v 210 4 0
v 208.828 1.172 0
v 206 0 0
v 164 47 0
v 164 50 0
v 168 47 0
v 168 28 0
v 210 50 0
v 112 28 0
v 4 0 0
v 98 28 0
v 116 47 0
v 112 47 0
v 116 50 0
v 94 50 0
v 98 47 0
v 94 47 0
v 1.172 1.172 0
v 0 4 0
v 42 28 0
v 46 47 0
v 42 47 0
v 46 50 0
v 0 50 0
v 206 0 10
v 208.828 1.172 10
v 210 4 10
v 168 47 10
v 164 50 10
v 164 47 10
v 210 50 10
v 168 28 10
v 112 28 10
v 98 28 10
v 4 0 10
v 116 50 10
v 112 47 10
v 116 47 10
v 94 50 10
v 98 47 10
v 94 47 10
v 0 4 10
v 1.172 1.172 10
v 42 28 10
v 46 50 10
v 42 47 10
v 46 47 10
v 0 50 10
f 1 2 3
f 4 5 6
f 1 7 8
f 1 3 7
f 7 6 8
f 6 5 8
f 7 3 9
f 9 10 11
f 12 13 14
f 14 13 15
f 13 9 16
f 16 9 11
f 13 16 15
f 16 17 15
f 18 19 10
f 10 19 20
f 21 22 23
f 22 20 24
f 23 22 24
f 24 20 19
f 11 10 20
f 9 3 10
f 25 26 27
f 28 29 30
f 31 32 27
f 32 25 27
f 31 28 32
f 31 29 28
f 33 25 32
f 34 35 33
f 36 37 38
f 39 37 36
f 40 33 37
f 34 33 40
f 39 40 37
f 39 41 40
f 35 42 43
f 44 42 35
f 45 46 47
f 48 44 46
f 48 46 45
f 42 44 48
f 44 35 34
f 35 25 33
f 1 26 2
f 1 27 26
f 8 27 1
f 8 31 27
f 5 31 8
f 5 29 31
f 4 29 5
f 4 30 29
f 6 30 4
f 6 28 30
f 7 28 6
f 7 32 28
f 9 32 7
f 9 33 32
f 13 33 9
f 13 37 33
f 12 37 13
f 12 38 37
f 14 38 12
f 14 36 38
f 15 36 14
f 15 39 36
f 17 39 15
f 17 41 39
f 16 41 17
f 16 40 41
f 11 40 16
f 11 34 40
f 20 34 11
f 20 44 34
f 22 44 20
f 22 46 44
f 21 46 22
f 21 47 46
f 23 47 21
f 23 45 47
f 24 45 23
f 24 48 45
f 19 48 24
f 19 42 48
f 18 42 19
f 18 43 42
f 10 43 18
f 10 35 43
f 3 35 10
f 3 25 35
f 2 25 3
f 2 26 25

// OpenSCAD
$fn = 32;

// ----------------------------------------------------------------------
// Oversize slot bar: 210 mm bar with 2 oversize windows
// ----------------------------------------------------------------------

// --- parameters (mm) ---
profile_height = 10;      // extrusion height
profile_points = 24;      // points of the closed outline

profile = [[0, 4], [1.172, 1.172], [4, 0], [206, 0], [208.828, 1.172], [210, 4], [210, 50], [164, 50], [164, 47], [168, 47], [168, 28], [112, 28], [112, 47], [116, 47], [116, 50], [94, 50], [94, 47], [98, 47], [98, 28], [42, 28], [42, 47], [46, 47], [46, 50], [0, 50]];  // single closed polygon, 24 points, counter clockwise

// --- the one profile operation ---
linear_extrude(height = profile_height) polygon(points = profile);
